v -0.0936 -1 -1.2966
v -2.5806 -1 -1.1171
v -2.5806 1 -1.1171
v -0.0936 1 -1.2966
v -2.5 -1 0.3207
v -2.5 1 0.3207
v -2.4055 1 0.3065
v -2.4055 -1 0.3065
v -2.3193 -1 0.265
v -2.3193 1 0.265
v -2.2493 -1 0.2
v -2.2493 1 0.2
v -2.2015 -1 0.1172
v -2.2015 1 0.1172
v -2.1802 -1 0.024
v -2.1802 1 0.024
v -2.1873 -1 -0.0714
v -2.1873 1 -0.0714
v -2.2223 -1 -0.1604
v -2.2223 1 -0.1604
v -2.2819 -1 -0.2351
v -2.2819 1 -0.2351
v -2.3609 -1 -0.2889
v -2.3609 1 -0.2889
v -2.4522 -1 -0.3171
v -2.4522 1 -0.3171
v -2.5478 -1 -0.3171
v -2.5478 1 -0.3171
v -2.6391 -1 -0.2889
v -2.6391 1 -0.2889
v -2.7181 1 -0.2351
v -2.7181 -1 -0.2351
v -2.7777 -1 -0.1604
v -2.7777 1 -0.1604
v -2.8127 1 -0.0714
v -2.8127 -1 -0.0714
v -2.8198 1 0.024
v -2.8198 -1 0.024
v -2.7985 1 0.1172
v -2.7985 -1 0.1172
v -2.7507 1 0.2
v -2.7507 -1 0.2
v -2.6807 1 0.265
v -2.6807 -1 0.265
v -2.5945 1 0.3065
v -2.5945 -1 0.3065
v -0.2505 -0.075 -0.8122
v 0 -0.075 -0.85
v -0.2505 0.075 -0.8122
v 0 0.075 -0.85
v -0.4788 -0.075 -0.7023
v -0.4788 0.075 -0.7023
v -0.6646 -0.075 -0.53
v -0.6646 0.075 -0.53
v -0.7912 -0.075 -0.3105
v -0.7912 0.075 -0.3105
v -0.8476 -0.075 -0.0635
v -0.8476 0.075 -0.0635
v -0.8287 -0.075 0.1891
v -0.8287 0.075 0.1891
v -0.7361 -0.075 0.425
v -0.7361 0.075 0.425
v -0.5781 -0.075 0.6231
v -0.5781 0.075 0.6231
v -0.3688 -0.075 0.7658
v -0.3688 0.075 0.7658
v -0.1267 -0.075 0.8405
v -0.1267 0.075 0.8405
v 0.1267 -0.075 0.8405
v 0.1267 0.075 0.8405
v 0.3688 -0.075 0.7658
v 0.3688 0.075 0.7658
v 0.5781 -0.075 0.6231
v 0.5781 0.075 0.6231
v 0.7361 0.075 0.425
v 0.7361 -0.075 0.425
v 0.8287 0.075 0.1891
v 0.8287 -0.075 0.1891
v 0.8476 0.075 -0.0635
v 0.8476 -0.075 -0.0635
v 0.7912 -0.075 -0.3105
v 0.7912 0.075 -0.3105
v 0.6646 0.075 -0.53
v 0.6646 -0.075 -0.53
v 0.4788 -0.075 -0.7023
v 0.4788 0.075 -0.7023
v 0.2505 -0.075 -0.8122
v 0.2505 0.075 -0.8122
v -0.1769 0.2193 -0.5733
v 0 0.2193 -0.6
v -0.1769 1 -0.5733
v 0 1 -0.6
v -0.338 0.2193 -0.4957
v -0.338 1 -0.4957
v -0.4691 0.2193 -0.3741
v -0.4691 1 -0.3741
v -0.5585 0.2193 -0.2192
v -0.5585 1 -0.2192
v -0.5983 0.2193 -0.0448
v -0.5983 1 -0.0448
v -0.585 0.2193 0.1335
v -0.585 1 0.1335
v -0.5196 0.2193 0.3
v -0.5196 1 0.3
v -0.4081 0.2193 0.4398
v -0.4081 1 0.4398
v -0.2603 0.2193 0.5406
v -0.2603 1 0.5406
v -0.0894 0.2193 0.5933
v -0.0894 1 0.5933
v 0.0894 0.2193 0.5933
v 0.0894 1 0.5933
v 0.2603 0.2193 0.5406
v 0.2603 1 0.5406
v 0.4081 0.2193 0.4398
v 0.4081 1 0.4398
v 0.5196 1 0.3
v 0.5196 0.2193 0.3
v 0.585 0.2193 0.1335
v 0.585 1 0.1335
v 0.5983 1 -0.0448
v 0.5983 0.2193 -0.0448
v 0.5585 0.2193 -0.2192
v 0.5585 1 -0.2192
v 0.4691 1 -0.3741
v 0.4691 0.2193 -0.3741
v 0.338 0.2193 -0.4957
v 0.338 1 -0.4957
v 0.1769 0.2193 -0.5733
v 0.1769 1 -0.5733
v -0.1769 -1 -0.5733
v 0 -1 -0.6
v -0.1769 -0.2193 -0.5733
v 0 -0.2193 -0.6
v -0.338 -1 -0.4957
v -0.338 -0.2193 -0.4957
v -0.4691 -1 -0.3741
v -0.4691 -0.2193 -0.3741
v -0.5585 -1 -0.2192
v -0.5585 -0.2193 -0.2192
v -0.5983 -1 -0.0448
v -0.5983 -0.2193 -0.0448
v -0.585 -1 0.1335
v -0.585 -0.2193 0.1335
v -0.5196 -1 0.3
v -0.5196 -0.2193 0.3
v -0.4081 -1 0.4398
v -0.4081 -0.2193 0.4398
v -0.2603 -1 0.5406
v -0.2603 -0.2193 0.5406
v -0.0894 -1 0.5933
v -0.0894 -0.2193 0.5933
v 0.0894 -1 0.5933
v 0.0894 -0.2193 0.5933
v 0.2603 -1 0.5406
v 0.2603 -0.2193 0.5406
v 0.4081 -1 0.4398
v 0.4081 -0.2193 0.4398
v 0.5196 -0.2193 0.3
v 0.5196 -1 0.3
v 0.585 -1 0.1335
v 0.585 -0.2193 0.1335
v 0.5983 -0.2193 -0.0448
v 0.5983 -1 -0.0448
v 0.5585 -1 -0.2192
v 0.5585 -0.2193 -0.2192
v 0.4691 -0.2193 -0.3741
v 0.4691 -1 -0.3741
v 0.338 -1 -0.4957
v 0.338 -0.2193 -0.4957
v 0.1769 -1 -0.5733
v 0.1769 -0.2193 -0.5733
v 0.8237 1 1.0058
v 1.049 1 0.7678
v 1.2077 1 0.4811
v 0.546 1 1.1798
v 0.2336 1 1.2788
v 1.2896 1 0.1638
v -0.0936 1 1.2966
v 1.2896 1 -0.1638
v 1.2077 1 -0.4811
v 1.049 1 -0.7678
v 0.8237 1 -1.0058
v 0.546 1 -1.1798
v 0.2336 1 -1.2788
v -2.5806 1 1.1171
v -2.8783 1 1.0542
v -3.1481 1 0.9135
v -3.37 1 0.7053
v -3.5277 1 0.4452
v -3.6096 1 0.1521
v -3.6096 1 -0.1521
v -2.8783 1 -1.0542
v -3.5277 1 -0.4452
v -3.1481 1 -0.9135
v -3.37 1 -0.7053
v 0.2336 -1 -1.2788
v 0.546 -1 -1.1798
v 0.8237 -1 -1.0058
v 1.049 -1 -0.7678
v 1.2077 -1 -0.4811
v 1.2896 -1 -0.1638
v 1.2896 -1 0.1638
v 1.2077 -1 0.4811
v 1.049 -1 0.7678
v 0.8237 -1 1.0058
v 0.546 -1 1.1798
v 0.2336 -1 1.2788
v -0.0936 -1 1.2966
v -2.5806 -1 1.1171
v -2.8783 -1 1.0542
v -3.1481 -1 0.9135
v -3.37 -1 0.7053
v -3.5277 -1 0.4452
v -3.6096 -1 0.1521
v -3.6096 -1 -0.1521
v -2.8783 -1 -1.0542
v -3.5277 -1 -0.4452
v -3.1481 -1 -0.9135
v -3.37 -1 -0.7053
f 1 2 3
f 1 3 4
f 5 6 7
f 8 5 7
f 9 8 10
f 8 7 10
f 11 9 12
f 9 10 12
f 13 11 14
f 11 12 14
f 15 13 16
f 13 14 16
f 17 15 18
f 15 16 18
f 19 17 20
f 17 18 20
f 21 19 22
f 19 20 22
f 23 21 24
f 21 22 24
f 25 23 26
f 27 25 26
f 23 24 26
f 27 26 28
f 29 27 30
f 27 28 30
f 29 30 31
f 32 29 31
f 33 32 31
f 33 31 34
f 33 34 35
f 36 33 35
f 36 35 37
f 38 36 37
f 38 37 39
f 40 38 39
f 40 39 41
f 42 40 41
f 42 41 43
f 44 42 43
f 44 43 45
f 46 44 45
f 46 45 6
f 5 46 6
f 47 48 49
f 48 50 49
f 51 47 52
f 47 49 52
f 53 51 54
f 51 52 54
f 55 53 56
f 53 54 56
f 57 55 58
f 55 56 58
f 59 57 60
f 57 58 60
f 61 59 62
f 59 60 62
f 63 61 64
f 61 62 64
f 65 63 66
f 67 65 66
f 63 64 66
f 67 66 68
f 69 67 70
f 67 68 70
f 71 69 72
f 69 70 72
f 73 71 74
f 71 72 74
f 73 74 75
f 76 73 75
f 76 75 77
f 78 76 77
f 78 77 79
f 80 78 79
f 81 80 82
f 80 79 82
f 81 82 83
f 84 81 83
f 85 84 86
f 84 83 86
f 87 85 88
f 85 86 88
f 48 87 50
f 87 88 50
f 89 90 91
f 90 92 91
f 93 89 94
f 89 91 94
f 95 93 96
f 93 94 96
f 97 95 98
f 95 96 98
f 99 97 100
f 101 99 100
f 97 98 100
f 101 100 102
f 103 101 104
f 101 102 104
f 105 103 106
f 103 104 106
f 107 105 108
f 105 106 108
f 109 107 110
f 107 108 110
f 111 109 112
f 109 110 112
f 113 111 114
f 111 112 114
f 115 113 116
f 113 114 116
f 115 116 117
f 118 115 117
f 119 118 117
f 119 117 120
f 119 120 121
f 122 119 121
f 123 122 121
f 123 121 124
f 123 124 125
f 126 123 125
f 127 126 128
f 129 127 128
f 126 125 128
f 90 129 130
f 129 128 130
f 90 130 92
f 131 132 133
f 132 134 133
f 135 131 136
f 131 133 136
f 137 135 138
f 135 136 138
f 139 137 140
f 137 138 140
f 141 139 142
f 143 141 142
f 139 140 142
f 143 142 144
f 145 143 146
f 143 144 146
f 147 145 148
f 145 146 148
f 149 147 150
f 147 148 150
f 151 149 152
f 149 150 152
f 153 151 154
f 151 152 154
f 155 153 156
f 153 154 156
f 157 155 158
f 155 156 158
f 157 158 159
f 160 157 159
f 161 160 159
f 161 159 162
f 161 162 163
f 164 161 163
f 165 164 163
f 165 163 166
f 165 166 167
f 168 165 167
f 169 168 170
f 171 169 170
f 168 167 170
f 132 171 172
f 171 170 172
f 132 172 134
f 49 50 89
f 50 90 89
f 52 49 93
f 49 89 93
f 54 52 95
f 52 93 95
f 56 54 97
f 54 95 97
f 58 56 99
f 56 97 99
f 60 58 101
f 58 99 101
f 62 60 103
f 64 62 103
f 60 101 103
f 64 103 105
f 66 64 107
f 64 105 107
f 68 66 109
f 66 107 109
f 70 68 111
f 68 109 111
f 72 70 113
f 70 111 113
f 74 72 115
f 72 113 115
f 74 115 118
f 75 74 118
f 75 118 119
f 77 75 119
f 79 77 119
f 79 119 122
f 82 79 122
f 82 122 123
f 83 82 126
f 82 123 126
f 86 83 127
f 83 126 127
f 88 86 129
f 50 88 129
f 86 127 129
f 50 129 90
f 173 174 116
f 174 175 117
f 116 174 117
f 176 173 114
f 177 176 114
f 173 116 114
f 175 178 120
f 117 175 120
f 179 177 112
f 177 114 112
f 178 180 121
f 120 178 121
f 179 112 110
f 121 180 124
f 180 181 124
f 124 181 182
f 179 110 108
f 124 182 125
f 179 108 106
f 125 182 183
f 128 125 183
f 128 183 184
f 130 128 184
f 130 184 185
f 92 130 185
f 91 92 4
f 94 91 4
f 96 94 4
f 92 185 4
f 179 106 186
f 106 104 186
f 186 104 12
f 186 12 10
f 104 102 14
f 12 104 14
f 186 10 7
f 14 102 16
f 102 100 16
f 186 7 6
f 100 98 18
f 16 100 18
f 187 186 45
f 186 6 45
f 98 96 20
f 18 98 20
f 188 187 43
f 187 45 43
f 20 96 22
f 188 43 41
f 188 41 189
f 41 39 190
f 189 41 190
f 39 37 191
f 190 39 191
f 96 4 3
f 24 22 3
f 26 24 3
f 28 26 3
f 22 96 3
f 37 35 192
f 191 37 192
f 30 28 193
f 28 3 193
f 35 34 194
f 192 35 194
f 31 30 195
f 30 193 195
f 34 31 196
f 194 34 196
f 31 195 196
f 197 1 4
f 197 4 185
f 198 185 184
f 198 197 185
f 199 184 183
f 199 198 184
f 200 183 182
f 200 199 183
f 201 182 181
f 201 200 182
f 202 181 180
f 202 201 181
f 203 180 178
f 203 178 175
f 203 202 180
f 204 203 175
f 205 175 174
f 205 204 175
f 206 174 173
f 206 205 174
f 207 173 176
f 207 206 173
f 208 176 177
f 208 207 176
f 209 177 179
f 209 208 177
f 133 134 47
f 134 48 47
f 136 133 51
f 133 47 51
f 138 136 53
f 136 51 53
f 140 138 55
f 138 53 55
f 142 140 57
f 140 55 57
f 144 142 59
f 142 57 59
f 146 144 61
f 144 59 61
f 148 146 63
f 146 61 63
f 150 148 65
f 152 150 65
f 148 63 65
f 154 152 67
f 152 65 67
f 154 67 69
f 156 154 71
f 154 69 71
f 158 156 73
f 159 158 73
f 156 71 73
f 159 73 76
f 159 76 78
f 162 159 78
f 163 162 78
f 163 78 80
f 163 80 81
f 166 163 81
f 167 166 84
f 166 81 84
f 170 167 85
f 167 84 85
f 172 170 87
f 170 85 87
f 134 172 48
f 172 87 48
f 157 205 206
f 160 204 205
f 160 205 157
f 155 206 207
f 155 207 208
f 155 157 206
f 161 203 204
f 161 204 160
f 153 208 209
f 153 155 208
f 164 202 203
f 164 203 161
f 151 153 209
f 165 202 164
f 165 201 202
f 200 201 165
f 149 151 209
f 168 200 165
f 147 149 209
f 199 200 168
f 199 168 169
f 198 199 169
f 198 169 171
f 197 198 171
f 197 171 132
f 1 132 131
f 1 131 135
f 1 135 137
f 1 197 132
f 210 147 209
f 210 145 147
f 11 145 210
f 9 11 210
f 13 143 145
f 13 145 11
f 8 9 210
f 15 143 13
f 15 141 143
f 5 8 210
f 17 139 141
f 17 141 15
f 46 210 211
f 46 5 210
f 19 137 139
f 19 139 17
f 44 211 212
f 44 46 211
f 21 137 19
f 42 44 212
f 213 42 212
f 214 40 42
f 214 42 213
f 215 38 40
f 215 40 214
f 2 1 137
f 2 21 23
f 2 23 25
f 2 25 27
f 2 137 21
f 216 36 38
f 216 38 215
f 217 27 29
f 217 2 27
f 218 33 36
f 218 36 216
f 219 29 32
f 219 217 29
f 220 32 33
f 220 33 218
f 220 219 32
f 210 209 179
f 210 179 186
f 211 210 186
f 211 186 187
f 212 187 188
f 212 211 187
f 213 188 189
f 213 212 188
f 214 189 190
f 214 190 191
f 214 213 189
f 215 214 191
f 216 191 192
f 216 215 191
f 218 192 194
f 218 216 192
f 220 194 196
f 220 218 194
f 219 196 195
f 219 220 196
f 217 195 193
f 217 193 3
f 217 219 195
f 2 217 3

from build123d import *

# Parameters (mm, degrees)
BOSS_EXTRUDE1_DEPTH      = 1
BOSS_EXTRUDE1_DEPTH_BACK = 1
CUT_EXTRUDE1_REACH       = 6.335
SKETCH5_R                = 0.3207


with BuildPart() as part:
    # Sketch1 → Boss-Extrude1 (new, two sides: drawn at the far end of the back side and taken through both)
    with BuildSketch(Plane(origin=(0, 0, 0), x_dir=(1, 0, 0), z_dir=(0, 1, 0)).offset(-BOSS_EXTRUDE1_DEPTH_BACK)):
        with BuildLine():
            Line((-2.58064, 1.117093188), (-0.0936, 1.296626022))
            ThreePointArc((-0.0936, 1.296626022), (1.3, 0), (-0.0936, -1.296626022))
            Line((-0.0936, -1.296626022), (-2.58064, -1.117093188))
            ThreePointArc((-2.58064, -1.117093188), (-3.62, 0), (-2.58064, 1.117093188))
        make_face()
    extrude(amount=BOSS_EXTRUDE1_DEPTH + BOSS_EXTRUDE1_DEPTH_BACK)

    # Sketch4 → Cut-Revolve1 (revolve, cut)
    with BuildSketch(Plane.XY):
        Polygon((0.85, 0), (0.85, 0.075), (0.6, 0.219337567), (0.6, 1), (0, 1), (0, -1), (0.6, -1), (0.6, -0.219337567), (0.85, -0.075), align=None)
    revolve(axis=Axis((0, -1, 0), (0, 1, 0)), mode=Mode.SUBTRACT)

    # Sketch5 → Cut-Extrude1 (cut, up to next)
    with BuildSketch(Plane(origin=(0, 1, 0), x_dir=(1, 0, 0), z_dir=(0, 1, 0)), mode=Mode.PRIVATE) as cut_extrude1_sk1:
        with Locations((-2.5, 0)):
            Circle(SKETCH5_R)
    cut_extrude1_tool1 = extrude(cut_extrude1_sk1.sketch, amount=-CUT_EXTRUDE1_REACH, mode=Mode.PRIVATE) & part.part
    add(cut_extrude1_tool1.solids().sort_by_distance((-2.5, 1, 0))[0], mode=Mode.SUBTRACT)


solid = part.part
